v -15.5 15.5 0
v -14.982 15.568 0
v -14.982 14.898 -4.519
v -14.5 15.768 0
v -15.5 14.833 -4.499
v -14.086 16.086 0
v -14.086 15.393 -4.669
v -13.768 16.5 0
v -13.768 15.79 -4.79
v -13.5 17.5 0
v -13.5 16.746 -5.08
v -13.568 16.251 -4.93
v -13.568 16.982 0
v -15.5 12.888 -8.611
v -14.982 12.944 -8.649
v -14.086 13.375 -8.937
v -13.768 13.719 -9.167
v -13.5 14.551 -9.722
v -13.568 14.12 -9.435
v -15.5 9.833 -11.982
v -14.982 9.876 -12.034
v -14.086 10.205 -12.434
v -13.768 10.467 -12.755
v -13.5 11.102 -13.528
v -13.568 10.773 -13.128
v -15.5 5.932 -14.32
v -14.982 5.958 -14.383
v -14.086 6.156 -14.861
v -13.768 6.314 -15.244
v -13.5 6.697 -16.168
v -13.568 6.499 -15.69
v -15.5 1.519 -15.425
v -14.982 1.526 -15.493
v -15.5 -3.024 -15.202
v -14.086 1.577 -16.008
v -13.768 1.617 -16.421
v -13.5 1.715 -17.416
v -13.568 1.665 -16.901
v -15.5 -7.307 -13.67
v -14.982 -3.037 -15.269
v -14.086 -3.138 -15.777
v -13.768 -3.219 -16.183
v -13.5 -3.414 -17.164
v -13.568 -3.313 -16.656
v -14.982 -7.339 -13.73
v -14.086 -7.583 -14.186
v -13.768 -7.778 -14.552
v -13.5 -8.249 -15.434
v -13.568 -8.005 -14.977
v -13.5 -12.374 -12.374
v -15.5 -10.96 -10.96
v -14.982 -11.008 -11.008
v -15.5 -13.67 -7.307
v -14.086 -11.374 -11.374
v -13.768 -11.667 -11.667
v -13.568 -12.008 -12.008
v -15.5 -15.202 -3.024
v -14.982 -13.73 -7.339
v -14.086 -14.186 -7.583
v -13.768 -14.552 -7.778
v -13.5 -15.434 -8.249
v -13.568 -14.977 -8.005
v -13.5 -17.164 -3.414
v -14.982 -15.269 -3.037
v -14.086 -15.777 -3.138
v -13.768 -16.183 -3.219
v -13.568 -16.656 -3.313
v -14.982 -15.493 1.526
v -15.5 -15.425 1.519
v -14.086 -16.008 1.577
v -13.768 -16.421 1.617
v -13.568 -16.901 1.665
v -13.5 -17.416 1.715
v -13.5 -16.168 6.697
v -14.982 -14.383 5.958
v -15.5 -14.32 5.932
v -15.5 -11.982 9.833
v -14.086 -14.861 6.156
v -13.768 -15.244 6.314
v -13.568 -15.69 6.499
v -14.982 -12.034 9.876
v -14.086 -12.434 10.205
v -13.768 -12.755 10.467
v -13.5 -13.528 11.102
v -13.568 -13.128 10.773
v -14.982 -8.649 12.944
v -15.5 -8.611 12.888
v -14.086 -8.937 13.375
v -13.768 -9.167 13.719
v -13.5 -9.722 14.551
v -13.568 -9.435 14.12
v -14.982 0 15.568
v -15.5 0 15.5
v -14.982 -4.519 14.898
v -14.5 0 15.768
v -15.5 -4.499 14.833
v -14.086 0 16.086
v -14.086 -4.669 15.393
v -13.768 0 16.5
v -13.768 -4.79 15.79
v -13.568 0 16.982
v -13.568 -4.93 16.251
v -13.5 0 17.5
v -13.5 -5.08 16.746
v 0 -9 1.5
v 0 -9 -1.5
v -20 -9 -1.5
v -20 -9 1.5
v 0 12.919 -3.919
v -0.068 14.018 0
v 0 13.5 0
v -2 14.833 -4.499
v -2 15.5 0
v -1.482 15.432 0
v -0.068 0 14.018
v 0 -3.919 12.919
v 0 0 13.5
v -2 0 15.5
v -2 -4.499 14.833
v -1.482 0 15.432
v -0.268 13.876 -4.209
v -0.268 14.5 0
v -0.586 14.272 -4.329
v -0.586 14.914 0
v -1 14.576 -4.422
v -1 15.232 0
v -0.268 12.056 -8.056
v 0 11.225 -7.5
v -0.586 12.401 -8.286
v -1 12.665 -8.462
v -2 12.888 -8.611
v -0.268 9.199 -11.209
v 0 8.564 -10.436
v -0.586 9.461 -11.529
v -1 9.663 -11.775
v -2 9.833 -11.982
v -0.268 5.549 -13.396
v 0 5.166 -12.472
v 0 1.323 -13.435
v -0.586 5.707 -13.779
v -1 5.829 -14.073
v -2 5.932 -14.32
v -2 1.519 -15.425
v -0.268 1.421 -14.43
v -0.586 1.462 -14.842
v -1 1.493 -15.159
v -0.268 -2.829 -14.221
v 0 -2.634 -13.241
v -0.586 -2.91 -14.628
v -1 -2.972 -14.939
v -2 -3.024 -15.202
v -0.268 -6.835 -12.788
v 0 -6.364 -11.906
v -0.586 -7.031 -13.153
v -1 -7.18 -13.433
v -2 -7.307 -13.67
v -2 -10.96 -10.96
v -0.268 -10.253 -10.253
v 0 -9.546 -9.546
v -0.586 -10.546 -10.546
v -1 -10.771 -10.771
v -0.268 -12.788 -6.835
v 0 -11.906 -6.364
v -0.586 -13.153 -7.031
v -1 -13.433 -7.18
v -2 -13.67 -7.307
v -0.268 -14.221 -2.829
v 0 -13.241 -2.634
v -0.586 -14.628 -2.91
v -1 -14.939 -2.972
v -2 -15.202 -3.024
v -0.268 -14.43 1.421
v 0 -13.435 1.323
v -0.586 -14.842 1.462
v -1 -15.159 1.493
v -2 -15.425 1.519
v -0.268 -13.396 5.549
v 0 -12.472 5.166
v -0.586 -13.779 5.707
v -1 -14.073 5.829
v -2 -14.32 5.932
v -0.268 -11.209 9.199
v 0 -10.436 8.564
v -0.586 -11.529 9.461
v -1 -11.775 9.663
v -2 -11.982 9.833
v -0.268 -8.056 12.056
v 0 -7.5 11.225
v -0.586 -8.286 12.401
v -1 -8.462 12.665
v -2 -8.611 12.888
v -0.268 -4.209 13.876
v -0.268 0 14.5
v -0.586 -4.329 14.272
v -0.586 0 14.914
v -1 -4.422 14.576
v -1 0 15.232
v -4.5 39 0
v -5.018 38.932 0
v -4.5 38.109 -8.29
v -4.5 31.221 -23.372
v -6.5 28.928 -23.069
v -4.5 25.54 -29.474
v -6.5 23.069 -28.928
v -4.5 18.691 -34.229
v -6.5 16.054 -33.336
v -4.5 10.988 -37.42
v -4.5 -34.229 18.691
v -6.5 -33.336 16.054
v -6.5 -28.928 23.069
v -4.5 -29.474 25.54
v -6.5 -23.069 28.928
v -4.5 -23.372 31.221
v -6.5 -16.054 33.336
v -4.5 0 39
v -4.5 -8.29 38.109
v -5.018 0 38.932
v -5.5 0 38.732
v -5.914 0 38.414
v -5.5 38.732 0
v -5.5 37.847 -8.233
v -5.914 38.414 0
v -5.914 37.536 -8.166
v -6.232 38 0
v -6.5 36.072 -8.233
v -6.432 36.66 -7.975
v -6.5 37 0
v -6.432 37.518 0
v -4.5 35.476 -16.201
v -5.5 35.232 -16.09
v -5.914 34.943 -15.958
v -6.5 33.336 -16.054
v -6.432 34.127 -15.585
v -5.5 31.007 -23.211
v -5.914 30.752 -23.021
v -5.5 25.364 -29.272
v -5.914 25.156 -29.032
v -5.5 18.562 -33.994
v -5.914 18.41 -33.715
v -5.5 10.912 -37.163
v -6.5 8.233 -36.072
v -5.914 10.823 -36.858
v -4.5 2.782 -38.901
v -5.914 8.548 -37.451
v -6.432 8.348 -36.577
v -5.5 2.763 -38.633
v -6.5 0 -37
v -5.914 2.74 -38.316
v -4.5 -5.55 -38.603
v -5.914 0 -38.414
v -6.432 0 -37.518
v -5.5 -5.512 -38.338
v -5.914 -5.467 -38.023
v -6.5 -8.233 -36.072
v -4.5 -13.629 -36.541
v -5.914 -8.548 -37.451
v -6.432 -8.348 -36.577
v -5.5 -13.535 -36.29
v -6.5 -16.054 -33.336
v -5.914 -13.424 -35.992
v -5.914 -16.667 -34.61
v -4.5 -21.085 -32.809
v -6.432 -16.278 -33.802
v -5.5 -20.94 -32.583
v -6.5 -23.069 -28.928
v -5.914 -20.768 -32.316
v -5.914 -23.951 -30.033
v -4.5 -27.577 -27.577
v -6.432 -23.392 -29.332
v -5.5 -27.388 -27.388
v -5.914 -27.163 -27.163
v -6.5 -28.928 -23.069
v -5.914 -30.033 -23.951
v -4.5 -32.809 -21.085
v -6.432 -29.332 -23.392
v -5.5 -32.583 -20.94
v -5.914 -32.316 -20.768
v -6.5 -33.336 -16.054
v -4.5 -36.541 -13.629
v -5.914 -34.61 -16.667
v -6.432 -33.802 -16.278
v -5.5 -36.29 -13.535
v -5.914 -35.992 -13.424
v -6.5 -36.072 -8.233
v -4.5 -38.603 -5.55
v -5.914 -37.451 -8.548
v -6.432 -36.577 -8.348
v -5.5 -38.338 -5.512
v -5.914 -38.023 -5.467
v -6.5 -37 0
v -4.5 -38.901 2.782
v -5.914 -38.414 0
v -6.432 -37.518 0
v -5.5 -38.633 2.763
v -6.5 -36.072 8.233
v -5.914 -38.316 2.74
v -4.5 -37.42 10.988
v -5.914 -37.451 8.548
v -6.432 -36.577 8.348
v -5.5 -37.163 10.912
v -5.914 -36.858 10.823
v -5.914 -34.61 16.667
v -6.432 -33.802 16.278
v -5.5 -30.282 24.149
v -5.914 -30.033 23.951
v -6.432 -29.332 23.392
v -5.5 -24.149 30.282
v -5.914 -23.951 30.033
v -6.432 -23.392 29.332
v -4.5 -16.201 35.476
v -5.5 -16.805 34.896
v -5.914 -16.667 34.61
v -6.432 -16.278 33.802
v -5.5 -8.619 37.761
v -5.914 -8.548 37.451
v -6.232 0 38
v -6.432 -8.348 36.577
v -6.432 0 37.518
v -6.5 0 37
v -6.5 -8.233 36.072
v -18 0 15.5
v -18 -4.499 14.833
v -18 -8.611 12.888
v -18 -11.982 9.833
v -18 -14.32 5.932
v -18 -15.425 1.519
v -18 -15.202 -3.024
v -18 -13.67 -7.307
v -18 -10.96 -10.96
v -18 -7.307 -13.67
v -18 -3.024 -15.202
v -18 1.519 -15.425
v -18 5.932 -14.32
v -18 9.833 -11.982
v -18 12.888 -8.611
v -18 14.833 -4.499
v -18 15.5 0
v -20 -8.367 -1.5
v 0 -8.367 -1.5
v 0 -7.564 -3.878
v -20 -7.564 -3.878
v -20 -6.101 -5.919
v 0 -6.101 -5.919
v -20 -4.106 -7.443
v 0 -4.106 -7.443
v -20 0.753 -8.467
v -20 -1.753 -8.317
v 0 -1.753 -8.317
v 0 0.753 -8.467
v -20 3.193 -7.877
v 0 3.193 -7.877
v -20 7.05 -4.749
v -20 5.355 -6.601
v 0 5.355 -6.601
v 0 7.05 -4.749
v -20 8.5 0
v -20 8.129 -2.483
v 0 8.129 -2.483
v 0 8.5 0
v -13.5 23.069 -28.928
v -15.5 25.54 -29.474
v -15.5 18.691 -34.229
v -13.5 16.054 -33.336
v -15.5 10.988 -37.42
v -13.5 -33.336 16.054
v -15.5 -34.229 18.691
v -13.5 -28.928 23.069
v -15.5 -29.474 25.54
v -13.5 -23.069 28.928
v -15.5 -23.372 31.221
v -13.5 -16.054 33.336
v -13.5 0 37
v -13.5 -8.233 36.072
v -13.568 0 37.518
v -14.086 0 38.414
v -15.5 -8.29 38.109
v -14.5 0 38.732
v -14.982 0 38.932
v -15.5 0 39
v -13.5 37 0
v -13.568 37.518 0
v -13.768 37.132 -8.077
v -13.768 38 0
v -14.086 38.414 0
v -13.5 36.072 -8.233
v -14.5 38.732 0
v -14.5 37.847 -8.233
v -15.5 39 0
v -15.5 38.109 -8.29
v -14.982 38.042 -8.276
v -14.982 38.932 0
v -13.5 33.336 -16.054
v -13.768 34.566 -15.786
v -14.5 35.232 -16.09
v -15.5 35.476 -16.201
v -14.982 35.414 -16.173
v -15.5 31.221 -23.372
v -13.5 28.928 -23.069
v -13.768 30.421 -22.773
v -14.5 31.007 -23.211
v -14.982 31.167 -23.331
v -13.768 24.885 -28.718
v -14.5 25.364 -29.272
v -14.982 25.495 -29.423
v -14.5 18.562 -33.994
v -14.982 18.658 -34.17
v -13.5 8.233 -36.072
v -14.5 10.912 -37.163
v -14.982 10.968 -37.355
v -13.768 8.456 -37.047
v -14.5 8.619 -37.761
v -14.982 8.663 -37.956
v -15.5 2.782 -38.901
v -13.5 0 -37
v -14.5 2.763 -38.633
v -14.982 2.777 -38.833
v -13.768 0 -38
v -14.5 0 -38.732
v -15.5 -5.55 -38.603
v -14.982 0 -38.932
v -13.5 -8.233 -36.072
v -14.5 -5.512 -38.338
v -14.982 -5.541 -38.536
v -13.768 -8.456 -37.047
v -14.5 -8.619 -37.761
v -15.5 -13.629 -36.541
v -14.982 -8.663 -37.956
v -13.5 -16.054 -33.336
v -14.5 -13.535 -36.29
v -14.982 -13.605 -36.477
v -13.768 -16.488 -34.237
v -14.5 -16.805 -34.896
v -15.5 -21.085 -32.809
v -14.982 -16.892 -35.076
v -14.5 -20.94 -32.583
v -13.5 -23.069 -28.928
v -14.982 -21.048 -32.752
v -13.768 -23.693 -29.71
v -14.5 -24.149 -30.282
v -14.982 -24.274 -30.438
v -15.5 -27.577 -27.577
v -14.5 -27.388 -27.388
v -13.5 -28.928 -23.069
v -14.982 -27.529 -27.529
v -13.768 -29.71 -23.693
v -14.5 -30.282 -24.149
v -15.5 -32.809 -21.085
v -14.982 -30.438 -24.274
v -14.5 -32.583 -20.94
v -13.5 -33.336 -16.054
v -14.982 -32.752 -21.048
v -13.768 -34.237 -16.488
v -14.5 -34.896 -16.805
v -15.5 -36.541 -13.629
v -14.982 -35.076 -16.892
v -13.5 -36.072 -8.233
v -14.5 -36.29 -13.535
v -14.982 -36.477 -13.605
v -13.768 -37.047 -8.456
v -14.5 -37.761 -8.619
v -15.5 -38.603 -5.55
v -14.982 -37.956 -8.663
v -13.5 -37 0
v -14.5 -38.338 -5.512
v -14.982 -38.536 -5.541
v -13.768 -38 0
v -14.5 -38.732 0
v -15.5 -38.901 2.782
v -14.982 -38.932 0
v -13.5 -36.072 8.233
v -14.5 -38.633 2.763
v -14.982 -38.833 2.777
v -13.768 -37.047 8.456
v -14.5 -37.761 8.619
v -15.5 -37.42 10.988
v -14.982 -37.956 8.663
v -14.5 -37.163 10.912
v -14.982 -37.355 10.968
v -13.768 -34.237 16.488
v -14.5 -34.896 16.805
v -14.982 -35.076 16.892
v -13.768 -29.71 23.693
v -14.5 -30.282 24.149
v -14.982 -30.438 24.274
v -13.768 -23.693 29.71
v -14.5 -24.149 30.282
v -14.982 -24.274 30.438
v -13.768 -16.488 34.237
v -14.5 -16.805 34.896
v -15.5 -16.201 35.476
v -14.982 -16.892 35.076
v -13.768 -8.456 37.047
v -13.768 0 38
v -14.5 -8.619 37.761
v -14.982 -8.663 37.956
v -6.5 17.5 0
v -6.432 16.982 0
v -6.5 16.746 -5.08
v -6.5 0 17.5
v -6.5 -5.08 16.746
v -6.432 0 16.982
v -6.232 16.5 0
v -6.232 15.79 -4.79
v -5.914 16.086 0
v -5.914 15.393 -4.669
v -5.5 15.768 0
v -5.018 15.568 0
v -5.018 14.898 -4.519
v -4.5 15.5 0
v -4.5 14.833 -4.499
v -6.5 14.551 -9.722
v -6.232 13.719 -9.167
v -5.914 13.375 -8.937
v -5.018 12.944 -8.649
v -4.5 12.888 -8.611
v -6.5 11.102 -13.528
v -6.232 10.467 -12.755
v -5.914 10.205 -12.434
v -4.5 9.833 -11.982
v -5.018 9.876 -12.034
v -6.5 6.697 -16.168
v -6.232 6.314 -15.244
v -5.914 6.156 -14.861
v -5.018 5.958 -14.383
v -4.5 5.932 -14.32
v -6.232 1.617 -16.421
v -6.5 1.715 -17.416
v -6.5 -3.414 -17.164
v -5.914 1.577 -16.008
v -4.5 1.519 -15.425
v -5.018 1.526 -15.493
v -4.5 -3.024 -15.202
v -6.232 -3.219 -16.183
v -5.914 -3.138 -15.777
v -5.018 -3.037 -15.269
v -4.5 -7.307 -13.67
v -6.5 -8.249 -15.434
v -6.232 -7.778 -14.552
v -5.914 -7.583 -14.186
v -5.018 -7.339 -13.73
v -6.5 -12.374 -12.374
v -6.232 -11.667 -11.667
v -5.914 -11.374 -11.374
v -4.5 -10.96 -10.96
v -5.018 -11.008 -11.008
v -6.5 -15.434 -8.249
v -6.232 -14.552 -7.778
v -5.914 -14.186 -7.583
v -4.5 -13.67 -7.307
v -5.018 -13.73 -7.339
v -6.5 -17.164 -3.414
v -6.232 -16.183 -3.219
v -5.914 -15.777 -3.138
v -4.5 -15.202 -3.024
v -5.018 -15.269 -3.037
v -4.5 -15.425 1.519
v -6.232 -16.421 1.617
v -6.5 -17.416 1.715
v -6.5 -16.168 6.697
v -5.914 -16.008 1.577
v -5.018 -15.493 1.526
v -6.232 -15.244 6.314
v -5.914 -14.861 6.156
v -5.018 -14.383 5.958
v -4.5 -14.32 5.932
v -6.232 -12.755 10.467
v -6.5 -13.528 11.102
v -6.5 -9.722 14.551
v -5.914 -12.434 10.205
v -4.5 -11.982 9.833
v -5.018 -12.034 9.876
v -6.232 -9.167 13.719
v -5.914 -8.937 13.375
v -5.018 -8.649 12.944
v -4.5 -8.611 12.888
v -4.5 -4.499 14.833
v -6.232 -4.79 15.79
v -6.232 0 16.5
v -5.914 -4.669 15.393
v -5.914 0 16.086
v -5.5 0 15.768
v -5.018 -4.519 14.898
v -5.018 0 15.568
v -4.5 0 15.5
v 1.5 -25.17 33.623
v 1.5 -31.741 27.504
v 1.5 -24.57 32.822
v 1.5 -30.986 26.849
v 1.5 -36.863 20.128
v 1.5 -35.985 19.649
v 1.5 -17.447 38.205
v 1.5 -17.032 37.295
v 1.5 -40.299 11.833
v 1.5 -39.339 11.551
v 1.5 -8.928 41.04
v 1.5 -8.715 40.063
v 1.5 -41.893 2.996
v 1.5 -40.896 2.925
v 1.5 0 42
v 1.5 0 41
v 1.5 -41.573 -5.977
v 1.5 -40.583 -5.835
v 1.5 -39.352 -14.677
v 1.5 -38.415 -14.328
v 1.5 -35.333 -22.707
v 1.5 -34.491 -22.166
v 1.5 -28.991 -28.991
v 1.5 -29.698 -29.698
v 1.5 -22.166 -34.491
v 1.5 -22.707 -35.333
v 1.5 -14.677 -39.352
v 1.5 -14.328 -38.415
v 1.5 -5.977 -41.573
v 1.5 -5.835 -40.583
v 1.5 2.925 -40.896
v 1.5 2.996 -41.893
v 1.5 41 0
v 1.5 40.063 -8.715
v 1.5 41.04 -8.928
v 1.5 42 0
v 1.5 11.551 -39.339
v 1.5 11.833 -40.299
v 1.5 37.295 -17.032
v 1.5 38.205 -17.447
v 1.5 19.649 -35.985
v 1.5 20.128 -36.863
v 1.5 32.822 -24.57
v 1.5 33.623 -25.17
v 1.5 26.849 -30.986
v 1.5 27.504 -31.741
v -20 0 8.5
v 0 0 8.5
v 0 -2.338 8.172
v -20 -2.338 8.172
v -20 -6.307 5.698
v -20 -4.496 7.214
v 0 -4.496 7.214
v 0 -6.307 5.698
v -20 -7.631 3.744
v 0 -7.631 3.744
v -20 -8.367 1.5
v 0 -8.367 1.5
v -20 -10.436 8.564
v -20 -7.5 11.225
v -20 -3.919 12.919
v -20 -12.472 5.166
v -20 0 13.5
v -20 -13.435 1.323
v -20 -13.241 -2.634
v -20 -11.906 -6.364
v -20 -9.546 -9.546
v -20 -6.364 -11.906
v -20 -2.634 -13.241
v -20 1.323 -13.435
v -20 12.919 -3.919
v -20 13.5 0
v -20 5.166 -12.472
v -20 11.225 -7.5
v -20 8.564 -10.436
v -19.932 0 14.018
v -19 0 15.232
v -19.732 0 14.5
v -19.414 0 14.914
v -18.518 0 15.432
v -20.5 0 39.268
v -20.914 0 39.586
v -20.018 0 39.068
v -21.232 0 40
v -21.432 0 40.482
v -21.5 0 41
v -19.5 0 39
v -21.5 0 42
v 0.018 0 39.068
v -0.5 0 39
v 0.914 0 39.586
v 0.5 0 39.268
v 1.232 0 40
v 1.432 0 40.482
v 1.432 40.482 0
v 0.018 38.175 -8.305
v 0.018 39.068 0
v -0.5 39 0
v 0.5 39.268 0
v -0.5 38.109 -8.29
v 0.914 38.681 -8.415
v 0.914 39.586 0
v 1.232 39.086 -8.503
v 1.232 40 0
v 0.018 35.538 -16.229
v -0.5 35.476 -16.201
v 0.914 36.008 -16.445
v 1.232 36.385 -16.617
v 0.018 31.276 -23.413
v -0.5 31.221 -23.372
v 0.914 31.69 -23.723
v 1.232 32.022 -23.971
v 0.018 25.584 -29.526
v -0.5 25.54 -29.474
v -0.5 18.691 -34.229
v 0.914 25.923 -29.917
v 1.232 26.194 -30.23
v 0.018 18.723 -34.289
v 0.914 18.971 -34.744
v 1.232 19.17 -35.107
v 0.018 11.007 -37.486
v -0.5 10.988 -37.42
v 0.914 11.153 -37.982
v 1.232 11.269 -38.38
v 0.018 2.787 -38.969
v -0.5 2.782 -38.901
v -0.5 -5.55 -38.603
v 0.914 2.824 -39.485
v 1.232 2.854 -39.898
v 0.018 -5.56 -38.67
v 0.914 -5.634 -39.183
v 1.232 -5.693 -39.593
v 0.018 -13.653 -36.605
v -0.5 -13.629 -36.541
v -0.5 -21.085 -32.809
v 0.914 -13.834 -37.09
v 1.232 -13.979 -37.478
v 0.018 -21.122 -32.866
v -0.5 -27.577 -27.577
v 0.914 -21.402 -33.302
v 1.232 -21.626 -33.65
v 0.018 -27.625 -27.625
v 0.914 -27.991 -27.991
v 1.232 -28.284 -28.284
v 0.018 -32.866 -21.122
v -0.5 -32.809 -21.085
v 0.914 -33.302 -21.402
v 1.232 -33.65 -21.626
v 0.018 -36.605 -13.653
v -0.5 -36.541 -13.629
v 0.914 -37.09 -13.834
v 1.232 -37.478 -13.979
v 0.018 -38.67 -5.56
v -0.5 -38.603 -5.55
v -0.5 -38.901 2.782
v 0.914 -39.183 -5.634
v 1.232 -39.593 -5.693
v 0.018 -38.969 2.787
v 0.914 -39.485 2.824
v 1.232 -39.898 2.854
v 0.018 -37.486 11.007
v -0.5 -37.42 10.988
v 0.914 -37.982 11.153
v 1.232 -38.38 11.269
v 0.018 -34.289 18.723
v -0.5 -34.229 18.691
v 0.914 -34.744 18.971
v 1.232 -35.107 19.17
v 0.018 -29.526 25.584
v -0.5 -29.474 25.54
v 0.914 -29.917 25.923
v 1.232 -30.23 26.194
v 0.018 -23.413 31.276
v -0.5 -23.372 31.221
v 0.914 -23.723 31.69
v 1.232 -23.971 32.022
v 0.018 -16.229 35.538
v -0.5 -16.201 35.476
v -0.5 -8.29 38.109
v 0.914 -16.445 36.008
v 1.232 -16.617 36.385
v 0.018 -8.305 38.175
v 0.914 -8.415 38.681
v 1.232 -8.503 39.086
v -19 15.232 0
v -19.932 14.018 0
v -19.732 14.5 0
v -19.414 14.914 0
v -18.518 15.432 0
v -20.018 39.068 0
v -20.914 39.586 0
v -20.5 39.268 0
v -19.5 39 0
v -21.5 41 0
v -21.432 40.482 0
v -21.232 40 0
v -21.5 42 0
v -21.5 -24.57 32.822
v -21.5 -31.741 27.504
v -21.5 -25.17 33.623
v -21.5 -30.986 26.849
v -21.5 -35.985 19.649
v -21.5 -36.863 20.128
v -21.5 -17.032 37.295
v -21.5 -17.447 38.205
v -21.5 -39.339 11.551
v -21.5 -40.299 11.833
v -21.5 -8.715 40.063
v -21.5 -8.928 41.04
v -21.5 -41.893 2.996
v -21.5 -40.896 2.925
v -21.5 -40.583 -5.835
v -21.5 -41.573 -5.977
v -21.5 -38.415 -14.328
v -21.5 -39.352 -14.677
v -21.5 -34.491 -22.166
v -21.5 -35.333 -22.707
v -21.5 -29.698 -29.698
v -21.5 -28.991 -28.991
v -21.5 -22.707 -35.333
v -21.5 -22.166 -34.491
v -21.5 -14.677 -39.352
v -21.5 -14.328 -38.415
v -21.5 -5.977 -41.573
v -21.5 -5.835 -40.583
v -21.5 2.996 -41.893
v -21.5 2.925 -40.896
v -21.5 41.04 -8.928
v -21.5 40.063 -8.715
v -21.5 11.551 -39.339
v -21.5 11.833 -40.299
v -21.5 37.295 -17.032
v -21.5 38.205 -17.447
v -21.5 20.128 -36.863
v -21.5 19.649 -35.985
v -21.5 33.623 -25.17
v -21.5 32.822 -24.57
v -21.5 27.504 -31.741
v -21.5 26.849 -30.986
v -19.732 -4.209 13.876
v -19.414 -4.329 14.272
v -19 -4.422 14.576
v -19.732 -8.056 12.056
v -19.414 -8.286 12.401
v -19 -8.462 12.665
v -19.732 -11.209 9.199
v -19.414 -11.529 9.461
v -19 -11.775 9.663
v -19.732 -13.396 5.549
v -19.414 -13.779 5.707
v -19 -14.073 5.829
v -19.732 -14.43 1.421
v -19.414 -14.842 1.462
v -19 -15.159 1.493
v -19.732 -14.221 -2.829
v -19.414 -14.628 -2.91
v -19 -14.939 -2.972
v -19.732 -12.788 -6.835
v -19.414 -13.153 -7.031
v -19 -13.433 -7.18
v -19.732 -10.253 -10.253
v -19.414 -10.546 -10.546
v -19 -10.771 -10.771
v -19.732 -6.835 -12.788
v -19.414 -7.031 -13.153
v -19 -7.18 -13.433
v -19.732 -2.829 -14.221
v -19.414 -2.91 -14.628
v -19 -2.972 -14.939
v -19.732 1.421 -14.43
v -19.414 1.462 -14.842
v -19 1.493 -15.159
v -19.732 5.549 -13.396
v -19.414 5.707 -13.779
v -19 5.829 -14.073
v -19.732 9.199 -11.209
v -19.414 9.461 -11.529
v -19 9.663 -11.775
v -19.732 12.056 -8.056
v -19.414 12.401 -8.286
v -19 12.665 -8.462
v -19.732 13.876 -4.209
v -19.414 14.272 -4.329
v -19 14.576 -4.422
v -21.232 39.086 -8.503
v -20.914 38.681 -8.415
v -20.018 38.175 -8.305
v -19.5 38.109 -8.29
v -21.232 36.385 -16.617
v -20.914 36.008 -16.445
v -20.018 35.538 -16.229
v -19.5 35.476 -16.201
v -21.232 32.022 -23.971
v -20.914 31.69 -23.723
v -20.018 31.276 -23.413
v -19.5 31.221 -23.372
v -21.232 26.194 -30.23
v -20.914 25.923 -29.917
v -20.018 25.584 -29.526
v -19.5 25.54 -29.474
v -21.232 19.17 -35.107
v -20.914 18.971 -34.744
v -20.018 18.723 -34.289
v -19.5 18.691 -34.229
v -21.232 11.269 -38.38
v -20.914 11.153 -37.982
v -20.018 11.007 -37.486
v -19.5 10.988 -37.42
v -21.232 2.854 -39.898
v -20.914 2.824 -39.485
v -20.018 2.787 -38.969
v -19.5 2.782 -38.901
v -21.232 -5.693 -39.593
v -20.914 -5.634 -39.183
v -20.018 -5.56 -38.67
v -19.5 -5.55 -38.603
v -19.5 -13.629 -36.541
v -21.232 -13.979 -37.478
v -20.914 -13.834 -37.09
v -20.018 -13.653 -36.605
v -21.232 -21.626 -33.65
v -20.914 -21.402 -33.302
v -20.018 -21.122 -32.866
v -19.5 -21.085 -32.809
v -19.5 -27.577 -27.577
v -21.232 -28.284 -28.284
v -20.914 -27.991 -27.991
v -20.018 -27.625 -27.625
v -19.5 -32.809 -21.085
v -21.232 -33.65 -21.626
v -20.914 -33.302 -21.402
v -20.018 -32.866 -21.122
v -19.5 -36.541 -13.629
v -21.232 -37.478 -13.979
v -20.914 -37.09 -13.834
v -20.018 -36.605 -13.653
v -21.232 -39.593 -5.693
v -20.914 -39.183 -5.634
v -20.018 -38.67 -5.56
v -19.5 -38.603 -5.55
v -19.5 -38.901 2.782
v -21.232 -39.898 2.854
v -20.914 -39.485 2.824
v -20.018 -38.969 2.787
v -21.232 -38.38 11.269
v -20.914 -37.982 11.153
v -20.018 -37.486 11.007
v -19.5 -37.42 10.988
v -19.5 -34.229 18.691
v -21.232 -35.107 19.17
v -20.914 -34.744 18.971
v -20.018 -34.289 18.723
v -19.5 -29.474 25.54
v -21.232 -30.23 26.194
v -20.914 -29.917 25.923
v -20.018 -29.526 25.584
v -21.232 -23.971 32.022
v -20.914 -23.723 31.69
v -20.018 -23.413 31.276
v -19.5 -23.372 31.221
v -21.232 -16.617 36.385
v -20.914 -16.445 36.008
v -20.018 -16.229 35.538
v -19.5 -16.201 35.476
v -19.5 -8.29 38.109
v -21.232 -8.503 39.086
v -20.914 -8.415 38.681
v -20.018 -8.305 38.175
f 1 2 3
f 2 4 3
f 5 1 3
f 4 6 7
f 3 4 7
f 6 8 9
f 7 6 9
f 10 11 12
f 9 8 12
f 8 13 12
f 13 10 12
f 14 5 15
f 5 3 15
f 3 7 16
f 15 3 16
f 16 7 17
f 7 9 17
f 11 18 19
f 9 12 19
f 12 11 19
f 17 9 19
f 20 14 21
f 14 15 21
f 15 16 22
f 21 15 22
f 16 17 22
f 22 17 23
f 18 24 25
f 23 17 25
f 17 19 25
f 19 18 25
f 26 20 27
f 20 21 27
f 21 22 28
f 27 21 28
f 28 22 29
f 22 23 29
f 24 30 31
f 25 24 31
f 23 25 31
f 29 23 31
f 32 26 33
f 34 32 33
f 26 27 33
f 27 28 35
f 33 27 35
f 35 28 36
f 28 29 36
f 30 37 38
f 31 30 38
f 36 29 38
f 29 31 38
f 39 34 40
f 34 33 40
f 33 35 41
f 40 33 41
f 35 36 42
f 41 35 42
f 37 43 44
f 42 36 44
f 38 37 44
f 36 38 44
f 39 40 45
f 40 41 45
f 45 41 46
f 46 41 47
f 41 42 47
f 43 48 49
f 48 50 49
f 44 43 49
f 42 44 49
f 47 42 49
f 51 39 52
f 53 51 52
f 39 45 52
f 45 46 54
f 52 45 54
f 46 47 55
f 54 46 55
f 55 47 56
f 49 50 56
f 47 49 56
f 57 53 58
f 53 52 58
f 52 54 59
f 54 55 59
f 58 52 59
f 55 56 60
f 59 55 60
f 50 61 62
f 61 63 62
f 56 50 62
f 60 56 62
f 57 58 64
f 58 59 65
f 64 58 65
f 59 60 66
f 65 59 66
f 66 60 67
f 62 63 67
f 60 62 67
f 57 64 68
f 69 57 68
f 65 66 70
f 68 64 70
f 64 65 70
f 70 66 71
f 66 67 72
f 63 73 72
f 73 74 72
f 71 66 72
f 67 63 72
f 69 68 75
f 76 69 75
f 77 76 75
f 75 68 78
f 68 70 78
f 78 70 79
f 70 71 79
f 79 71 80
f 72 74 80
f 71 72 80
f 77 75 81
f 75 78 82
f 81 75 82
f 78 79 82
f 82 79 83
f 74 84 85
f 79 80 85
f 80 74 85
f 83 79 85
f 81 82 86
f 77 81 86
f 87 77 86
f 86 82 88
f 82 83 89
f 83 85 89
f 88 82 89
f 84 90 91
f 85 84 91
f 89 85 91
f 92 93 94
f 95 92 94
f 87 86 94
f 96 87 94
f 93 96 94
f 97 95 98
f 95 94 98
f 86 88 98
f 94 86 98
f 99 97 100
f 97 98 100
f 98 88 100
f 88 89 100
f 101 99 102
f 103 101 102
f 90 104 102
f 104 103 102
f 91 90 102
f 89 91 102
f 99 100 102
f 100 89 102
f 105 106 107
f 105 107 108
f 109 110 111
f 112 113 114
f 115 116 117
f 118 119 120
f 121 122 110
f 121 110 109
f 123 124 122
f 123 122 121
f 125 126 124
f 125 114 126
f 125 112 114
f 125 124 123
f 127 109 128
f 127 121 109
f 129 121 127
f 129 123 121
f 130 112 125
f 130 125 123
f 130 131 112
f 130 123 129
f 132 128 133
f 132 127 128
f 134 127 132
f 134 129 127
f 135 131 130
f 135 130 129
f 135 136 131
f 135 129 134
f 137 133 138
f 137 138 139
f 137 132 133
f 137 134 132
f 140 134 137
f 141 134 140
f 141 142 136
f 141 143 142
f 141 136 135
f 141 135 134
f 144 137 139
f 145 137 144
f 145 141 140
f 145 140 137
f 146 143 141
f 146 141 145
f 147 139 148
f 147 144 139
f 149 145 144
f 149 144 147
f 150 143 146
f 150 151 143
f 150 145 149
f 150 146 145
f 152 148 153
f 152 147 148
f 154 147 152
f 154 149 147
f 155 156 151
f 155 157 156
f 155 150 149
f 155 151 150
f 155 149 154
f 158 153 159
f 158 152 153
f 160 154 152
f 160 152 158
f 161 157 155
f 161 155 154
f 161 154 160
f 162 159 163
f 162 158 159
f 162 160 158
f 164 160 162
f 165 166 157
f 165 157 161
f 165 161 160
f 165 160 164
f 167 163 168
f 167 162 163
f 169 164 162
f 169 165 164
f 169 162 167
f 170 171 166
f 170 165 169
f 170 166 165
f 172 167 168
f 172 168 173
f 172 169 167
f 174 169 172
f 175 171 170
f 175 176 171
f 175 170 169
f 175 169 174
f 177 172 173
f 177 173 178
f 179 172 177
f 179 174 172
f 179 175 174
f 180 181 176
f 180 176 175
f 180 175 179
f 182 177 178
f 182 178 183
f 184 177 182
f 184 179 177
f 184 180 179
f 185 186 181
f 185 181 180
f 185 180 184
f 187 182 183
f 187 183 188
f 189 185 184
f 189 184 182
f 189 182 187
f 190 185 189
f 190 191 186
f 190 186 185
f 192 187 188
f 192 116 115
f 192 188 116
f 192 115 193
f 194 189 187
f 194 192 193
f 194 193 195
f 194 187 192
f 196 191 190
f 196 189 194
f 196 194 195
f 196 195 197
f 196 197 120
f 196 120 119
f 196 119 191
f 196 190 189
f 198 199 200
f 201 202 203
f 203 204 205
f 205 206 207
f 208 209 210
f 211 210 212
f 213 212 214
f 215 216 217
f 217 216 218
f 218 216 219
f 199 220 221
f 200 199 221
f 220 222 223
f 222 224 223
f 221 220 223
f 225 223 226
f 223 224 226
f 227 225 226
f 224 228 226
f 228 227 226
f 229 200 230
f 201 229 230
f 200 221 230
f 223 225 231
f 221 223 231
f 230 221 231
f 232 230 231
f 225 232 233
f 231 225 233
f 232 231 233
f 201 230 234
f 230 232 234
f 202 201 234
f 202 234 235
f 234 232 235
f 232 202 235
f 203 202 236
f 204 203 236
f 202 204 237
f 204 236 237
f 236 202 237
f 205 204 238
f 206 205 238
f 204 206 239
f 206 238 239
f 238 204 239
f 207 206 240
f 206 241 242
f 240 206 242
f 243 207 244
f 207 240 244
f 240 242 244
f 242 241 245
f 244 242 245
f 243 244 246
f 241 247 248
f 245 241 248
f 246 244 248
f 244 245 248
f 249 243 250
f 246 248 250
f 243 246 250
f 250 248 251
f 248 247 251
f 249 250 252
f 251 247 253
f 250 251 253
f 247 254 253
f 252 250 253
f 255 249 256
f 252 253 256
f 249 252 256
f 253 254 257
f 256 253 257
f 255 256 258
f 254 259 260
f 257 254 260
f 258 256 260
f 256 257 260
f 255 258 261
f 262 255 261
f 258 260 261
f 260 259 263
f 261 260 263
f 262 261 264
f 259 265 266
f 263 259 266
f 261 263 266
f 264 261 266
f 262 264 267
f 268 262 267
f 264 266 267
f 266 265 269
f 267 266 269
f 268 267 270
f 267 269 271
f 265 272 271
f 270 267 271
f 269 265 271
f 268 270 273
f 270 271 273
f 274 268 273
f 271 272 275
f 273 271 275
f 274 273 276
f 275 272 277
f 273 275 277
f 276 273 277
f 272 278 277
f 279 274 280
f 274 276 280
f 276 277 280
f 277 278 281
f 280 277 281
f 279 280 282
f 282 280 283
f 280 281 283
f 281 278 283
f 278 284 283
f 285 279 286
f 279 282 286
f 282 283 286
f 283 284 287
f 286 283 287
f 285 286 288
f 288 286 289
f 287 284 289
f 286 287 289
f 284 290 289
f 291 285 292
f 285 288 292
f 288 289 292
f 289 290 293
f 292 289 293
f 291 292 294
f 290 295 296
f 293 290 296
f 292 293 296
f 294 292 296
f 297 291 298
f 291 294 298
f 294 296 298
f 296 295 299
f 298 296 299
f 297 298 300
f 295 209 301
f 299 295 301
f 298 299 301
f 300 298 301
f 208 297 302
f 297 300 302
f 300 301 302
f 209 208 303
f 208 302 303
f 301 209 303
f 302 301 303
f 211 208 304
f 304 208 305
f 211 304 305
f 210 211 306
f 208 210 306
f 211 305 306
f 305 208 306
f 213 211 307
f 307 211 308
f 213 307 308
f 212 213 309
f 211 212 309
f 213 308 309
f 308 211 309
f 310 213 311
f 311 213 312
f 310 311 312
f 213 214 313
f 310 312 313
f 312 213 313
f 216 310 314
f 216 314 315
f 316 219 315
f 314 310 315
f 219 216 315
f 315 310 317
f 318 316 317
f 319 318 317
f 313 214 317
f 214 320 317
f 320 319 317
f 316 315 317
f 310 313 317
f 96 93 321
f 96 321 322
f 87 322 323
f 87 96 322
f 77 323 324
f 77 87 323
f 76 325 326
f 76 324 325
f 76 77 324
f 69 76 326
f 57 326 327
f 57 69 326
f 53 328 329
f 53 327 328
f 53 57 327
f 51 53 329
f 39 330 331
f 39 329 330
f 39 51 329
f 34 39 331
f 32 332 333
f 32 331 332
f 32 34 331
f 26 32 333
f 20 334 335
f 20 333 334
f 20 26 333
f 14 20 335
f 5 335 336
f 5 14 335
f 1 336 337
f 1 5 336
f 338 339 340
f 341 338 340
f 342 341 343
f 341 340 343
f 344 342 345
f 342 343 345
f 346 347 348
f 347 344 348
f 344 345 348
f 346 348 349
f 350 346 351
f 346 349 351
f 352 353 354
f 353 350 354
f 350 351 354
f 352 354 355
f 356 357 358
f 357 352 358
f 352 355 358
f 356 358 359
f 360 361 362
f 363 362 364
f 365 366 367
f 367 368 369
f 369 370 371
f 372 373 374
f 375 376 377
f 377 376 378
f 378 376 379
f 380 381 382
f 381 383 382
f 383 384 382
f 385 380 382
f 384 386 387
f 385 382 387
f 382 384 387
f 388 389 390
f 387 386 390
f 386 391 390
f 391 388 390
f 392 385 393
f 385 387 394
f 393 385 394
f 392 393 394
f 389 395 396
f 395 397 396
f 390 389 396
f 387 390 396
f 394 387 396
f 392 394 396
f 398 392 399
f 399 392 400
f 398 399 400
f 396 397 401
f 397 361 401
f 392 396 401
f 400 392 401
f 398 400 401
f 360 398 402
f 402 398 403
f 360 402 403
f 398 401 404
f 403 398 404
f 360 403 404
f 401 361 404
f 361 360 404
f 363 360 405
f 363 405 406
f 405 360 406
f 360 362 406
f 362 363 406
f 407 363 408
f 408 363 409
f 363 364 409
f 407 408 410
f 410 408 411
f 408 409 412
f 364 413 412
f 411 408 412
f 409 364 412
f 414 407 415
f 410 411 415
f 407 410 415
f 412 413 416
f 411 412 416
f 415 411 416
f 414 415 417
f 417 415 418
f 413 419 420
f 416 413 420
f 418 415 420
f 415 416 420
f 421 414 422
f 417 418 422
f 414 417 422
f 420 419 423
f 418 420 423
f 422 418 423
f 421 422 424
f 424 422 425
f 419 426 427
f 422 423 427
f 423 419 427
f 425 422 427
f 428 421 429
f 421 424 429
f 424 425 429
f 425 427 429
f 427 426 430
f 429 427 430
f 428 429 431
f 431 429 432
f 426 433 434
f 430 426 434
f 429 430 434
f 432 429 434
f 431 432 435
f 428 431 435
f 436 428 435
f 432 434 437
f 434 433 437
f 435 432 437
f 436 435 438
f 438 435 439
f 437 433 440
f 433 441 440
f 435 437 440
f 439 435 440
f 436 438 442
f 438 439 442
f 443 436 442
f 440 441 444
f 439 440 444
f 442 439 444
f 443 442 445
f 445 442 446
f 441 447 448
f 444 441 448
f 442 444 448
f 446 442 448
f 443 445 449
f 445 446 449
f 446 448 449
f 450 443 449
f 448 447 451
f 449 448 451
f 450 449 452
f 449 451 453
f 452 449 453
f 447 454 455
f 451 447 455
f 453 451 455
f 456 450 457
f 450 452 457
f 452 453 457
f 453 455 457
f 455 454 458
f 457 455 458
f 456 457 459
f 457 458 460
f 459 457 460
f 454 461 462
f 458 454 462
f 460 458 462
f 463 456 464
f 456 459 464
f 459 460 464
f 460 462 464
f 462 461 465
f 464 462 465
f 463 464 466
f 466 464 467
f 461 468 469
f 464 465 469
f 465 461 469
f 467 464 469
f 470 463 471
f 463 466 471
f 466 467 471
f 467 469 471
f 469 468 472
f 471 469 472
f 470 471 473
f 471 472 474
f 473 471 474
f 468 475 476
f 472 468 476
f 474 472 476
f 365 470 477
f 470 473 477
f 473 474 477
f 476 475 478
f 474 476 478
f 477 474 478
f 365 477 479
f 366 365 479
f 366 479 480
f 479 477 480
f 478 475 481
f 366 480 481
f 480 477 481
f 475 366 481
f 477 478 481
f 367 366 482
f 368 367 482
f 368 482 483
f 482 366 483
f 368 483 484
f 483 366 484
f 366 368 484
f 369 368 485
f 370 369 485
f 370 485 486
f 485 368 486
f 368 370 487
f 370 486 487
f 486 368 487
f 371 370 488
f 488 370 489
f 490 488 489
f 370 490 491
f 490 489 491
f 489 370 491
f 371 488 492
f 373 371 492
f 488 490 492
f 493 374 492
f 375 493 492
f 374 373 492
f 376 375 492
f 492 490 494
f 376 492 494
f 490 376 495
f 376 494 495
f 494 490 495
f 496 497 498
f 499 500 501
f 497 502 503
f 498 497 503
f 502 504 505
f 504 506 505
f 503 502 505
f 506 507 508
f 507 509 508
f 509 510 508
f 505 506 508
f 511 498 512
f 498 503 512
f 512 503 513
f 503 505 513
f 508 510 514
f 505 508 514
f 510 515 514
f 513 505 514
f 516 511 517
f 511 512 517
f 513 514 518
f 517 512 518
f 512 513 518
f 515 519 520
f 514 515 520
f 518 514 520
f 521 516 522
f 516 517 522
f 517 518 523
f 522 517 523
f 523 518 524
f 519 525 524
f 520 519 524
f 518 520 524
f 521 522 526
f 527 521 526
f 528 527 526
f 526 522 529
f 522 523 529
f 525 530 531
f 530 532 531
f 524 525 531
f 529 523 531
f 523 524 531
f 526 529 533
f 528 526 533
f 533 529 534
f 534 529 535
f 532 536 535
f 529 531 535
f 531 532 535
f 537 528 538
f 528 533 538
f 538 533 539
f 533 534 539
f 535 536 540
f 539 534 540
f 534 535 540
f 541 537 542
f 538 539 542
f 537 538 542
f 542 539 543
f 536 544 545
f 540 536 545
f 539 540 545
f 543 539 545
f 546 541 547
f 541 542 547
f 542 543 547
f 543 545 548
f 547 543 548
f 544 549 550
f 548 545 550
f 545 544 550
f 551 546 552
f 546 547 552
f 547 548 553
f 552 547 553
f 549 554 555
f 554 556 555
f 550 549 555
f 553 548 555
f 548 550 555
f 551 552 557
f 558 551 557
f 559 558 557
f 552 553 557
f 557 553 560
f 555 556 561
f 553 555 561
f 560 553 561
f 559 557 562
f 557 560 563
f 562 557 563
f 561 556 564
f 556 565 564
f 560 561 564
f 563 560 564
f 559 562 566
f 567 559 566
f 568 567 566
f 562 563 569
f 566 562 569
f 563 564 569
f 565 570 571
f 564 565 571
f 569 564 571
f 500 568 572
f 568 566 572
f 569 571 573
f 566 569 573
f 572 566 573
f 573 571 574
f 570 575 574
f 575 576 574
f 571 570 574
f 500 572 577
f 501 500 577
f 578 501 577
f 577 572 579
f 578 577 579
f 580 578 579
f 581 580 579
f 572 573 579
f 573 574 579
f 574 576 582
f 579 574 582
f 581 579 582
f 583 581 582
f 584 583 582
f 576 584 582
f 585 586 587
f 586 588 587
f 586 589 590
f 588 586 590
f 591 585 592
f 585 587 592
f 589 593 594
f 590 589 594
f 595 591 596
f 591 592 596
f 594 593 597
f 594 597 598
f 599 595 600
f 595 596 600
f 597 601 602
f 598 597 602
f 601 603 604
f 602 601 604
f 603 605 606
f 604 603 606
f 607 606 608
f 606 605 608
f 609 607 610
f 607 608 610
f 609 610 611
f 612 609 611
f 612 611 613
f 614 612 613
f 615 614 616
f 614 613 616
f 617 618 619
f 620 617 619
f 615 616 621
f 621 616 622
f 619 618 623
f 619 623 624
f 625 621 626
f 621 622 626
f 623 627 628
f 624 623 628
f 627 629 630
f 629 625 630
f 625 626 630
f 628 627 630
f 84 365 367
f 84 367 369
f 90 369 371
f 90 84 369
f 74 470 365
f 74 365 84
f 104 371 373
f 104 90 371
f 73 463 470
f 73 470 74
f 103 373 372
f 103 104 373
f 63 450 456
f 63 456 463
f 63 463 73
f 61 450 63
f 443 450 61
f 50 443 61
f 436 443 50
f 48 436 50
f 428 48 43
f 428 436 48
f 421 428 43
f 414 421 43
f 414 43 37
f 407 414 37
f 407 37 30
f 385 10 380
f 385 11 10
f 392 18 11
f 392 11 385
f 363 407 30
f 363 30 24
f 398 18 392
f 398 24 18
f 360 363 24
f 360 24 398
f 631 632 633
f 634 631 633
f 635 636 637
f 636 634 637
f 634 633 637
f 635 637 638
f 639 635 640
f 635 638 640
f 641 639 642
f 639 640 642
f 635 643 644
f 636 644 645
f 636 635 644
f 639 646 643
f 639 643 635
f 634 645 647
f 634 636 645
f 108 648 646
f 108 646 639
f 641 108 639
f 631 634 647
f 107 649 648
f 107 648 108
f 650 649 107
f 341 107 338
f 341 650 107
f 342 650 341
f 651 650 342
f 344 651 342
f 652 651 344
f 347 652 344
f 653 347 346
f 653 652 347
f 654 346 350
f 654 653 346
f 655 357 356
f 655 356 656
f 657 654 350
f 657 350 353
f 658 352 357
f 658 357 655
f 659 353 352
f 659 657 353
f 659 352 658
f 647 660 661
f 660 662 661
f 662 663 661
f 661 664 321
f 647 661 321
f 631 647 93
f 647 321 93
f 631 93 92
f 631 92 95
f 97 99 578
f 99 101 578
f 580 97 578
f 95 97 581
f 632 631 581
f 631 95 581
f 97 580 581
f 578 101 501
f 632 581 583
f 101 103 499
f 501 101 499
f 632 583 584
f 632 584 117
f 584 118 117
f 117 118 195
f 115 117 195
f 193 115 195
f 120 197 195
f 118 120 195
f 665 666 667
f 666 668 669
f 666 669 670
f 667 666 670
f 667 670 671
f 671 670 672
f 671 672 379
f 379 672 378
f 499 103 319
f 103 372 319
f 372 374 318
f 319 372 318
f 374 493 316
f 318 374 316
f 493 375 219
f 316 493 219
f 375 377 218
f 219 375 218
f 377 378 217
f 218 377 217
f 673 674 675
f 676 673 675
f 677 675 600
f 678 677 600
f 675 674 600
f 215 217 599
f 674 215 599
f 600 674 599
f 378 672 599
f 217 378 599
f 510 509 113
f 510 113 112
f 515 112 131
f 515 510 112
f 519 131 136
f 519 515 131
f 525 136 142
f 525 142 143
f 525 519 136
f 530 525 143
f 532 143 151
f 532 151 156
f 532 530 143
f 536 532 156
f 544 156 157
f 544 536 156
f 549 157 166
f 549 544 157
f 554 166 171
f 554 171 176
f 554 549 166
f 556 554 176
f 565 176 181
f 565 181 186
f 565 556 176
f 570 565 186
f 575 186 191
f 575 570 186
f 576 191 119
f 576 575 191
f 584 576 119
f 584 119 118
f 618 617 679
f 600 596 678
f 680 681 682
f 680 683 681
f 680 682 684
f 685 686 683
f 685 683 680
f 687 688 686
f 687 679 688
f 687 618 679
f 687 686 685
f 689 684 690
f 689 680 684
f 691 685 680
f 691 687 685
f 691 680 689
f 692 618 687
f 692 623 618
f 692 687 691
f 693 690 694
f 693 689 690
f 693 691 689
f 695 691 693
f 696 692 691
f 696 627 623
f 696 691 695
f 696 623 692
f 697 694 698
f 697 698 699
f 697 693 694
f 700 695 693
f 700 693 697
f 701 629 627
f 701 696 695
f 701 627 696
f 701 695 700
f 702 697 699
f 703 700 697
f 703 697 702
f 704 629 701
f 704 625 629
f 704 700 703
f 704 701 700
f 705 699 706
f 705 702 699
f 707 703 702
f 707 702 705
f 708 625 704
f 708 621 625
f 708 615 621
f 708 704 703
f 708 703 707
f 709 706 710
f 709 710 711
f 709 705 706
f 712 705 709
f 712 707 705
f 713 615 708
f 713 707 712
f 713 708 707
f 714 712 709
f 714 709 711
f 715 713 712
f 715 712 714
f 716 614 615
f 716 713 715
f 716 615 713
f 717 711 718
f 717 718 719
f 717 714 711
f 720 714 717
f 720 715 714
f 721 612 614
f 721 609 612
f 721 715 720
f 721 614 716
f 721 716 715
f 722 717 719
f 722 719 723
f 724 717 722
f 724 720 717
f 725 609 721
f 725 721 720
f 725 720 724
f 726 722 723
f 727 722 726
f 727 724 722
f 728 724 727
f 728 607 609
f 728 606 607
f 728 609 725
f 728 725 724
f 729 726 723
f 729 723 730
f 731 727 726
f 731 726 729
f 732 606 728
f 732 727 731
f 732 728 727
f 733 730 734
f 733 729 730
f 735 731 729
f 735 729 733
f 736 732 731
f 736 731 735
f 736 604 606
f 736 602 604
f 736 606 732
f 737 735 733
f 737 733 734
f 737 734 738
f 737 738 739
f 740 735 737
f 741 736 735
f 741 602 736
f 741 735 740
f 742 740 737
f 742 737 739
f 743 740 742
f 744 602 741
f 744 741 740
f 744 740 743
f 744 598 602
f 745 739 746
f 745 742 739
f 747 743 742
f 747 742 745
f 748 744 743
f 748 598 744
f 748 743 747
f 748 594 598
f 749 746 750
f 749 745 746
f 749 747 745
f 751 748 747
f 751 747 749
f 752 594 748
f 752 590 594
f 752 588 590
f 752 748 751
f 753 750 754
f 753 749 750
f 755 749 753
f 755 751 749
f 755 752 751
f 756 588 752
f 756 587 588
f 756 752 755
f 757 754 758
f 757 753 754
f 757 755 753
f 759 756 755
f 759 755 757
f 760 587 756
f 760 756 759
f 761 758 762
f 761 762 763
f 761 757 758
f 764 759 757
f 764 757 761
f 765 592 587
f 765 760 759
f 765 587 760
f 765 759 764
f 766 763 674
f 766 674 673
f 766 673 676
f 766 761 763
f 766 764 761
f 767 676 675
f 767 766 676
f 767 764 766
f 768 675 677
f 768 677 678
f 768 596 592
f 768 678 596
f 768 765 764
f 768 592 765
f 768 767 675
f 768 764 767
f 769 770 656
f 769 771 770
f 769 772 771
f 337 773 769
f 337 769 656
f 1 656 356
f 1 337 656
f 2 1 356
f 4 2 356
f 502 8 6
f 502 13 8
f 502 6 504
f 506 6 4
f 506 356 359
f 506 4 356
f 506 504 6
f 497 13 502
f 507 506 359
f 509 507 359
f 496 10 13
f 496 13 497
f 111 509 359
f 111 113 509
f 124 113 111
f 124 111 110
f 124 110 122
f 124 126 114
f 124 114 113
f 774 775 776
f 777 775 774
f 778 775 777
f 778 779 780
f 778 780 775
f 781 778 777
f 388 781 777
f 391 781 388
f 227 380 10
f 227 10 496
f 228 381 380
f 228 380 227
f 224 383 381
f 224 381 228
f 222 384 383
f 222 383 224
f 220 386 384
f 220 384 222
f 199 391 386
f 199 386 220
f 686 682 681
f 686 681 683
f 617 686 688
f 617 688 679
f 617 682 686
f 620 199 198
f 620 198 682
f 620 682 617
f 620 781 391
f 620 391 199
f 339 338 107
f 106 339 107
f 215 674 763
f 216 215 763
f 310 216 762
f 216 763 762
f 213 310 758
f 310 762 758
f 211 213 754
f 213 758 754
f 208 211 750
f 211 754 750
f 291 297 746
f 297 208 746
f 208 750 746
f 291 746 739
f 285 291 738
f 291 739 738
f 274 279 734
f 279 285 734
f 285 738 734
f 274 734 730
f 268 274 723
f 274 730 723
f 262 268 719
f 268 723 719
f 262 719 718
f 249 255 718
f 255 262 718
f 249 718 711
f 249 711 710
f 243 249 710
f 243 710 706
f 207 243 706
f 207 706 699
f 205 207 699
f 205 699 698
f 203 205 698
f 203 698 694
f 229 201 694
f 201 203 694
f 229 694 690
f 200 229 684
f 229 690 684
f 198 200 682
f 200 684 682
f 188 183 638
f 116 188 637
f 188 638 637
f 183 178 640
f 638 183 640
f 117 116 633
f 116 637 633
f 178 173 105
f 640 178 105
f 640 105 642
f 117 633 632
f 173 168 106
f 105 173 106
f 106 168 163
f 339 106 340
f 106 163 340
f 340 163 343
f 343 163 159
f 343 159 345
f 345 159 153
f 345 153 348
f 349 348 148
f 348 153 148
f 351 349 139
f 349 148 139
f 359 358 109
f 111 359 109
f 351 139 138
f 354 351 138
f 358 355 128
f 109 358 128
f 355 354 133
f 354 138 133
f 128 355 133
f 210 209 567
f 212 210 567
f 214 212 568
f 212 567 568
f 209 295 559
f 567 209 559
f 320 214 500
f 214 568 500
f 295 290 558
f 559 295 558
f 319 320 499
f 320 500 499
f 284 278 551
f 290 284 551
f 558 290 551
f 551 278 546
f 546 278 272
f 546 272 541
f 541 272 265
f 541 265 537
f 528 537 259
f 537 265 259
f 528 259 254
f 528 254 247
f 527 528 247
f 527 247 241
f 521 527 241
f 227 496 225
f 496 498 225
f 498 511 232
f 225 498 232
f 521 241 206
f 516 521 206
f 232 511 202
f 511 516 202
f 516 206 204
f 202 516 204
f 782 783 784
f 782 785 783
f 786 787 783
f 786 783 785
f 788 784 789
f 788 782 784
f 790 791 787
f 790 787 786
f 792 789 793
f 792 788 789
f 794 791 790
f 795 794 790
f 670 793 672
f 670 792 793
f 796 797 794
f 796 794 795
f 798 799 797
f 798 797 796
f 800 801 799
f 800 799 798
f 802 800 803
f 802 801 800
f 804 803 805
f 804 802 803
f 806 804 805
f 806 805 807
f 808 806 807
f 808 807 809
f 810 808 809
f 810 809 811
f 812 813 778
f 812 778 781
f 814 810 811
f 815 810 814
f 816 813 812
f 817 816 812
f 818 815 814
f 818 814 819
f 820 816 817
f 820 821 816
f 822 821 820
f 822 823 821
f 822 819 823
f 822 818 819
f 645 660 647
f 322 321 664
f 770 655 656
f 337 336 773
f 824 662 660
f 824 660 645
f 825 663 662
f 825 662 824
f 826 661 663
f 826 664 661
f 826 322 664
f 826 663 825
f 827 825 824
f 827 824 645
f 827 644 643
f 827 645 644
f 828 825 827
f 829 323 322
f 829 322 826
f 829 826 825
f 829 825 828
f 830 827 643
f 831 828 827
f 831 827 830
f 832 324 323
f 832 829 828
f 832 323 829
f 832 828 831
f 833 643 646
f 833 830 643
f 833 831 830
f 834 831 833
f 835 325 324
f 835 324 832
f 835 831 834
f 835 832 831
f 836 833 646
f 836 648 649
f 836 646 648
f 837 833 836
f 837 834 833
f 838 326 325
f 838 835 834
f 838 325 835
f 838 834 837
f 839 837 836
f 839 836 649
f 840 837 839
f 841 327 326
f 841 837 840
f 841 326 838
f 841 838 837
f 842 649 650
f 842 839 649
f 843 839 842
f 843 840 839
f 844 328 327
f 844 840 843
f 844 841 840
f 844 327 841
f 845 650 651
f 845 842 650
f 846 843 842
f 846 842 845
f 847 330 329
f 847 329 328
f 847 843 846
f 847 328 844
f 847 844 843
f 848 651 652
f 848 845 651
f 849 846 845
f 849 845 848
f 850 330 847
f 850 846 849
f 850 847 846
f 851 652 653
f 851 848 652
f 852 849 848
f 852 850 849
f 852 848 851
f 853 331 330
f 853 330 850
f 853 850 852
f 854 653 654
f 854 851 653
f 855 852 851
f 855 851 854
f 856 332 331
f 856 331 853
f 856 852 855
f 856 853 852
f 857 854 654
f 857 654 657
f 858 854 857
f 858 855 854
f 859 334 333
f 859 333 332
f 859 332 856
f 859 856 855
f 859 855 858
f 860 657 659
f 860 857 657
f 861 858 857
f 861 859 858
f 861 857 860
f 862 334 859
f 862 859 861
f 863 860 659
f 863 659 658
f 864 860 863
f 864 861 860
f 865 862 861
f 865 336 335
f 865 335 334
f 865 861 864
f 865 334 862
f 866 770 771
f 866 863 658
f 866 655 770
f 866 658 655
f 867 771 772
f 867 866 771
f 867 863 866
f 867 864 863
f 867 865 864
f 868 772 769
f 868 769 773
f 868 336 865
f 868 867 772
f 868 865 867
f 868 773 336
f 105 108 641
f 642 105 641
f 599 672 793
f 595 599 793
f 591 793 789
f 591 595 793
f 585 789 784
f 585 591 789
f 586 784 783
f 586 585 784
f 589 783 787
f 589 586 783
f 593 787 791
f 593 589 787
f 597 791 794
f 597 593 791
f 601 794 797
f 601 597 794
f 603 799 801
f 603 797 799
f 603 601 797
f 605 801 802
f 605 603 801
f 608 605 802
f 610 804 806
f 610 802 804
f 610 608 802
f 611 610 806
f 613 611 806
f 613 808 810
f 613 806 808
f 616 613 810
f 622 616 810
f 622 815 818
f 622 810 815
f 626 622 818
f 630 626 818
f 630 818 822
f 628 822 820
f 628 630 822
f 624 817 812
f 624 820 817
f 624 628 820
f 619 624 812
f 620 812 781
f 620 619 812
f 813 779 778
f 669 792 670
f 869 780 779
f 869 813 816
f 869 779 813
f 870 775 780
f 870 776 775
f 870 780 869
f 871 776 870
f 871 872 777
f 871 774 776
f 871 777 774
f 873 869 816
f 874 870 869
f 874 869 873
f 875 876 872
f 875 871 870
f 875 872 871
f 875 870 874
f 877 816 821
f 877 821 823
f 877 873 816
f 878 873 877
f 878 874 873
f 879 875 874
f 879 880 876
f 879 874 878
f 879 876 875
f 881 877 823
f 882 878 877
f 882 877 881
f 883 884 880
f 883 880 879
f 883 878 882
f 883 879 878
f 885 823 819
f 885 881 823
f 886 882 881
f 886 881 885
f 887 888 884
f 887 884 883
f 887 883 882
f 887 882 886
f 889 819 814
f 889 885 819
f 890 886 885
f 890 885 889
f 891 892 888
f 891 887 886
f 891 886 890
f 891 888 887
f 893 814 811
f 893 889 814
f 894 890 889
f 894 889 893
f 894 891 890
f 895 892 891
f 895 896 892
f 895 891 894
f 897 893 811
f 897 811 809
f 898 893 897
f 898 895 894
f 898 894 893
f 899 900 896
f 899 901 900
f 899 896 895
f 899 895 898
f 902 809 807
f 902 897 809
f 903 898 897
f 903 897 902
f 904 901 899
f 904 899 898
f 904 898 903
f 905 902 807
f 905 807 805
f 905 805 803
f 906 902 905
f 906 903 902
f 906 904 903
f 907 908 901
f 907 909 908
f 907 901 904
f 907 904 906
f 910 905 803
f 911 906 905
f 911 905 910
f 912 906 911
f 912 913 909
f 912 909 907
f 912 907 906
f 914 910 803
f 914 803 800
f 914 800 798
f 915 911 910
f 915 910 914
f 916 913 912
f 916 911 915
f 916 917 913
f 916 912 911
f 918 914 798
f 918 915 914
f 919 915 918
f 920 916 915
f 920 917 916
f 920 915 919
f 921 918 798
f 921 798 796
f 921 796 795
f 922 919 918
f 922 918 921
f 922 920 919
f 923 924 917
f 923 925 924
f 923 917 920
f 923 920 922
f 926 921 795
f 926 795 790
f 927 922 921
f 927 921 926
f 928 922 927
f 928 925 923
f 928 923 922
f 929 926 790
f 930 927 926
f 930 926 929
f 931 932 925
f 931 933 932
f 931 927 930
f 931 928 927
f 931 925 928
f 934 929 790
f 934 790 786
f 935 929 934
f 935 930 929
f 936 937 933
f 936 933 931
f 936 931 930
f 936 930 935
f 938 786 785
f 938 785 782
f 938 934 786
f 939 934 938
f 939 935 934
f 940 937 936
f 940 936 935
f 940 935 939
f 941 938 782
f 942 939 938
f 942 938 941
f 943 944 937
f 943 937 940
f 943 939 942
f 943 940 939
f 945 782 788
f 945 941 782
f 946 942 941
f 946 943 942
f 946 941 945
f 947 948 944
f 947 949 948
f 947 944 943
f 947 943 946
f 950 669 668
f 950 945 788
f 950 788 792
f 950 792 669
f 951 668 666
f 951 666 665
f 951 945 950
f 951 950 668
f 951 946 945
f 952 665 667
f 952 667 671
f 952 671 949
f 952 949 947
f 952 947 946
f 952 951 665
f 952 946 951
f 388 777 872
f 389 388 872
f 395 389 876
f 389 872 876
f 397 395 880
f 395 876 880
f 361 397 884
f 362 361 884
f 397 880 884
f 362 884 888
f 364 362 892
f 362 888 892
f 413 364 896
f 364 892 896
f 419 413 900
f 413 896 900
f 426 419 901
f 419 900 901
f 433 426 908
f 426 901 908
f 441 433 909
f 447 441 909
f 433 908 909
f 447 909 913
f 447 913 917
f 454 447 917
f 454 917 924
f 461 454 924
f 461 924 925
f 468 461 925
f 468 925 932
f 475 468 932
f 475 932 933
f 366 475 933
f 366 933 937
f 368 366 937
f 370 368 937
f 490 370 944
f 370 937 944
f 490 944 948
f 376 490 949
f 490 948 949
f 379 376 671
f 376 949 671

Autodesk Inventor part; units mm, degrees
ref_plane "YZ Plane" through (0, 0, 0) normal (1, 0, 0) x (0, 1, 0)
ref_plane "XZ Plane" through (0, 0, 0) normal (0, 1, 0) x (-1, 0, 0)
ref_plane "XY Plane" through (0, 0, 0) normal (0, 0, 1) x (1, 0, 0)
sketch "草圖1" plane through (0, 0, 0) normal (0, 0, 1) x (1, 0, 0)
  line L0 (-20, 8.5) -> (0, 8.5)
  line L1 (0, 8.5) -> (0, 15.5)
  line L2 (0, 15.5) -> (-4.5, 15.5)
  line L3 (-6.5, 17.5) -> (-6.5, 37)
  line L4 (-20, 8.5) -> (-20, 15.5)
  line L5 (-4.5, 39) -> (-0.5, 39)
  line L6 (-20, 15.5) -> (-15.5, 15.5)
  line L7 (-13.5, 17.5) -> (-13.5, 37)
  line L8 (-15.5, 39) -> (-19.5, 39)
  line L9 (-21.5, 41) -> (-21.5, 42)
  line L10 (-21.5, 42) -> (1.5, 42)
  line L11 (1.5, 42) -> (1.5, 41)
  arc A0 (-13.5, 37) -> (-15.5, 39) centre (-15.5, 37) ccw
  arc A1 (-4.5, 39) -> (-6.5, 37) centre (-4.5, 37) ccw
  arc A2 (-0.5, 39) -> (1.5, 41) centre (-0.5, 41) ccw
  arc A3 (-21.5, 41) -> (-19.5, 39) centre (-19.5, 41) ccw
  arc A4 (-6.5, 17.5) -> (-4.5, 15.5) centre (-4.5, 17.5) ccw
  arc A5 (-15.5, 15.5) -> (-13.5, 17.5) centre (-15.5, 17.5) ccw
  line L12 (-40.2973, 0) -> (23.5613, 0)
  line L13 (-10, 42) -> (-10, 1.9657)
  point P0 (0, 0)
  point P1 (-6.5, 15.5)
  point P2 (-6.5, 39)
  point P3 (-13.5, 15.5)
  point P4 (-13.5, 39)
  point P5 (-21.5, 39)
  point P6 (1.5, 39)
  dimension "d15" = 0
  dimension "d28" = 23
  dimension "d29" = 7
  dimension "d30" = 20
  dimension "d35" = 84
  dimension "d36" = 78
  dimension "d37" = 17
  dimension "d38" = 31
  dimension "d39" = 0
  dimension "d40" = 31
  dimension "d41" = 78
  dimension "d42" = 8
  dimension "d43" = 2
  dimension "d45" = 20
revolve "迴轉1" add sketch "草圖1" angle 270 about axis through (-40.2973, 0, 0) along (-1, 0, 0)
fillet "圓角3" radius 2 2 edges at (0, -10.9602, -10.9602) (-20, -10.9602, -10.9602)
sketch "草圖11" plane through (0, 8.5, 0) normal (1, 0, 0) x (0, 0, -1)
  point P0 (0, -8.5)
sketch "草圖12" plane through (0, 8.5, 0) normal (1, 0, 0) x (0, 0, -1)
  arc A0 (-8.5, -8.5) -> (0, 0) centre (0, -8.5) ccw projected
  line L0 (0, -17) -> (0, -27.4427) construction
  line L1 (0, -17.5) -> (1.5, -17.5)
  line L2 (1.5, -17.5) -> (1.5, -16.8666)
  line L3 (0, -17.5) -> (-1.5, -17.5)
  line L4 (-1.5, -17.5) -> (-1.5, -16.2003)
  line L5 (-1.5, -16.2003) -> (1.5, -16.2003)
  line L6 (1.5, -16.2003) -> (1.5, -16.8666)
  point P0 (0, -8.5)
  dimension "d48" = 1.5
  dimension "d49" = 1.5
extrude "擠出2" cut sketch "草圖12" against normal up to next
properties part number "練習一"
